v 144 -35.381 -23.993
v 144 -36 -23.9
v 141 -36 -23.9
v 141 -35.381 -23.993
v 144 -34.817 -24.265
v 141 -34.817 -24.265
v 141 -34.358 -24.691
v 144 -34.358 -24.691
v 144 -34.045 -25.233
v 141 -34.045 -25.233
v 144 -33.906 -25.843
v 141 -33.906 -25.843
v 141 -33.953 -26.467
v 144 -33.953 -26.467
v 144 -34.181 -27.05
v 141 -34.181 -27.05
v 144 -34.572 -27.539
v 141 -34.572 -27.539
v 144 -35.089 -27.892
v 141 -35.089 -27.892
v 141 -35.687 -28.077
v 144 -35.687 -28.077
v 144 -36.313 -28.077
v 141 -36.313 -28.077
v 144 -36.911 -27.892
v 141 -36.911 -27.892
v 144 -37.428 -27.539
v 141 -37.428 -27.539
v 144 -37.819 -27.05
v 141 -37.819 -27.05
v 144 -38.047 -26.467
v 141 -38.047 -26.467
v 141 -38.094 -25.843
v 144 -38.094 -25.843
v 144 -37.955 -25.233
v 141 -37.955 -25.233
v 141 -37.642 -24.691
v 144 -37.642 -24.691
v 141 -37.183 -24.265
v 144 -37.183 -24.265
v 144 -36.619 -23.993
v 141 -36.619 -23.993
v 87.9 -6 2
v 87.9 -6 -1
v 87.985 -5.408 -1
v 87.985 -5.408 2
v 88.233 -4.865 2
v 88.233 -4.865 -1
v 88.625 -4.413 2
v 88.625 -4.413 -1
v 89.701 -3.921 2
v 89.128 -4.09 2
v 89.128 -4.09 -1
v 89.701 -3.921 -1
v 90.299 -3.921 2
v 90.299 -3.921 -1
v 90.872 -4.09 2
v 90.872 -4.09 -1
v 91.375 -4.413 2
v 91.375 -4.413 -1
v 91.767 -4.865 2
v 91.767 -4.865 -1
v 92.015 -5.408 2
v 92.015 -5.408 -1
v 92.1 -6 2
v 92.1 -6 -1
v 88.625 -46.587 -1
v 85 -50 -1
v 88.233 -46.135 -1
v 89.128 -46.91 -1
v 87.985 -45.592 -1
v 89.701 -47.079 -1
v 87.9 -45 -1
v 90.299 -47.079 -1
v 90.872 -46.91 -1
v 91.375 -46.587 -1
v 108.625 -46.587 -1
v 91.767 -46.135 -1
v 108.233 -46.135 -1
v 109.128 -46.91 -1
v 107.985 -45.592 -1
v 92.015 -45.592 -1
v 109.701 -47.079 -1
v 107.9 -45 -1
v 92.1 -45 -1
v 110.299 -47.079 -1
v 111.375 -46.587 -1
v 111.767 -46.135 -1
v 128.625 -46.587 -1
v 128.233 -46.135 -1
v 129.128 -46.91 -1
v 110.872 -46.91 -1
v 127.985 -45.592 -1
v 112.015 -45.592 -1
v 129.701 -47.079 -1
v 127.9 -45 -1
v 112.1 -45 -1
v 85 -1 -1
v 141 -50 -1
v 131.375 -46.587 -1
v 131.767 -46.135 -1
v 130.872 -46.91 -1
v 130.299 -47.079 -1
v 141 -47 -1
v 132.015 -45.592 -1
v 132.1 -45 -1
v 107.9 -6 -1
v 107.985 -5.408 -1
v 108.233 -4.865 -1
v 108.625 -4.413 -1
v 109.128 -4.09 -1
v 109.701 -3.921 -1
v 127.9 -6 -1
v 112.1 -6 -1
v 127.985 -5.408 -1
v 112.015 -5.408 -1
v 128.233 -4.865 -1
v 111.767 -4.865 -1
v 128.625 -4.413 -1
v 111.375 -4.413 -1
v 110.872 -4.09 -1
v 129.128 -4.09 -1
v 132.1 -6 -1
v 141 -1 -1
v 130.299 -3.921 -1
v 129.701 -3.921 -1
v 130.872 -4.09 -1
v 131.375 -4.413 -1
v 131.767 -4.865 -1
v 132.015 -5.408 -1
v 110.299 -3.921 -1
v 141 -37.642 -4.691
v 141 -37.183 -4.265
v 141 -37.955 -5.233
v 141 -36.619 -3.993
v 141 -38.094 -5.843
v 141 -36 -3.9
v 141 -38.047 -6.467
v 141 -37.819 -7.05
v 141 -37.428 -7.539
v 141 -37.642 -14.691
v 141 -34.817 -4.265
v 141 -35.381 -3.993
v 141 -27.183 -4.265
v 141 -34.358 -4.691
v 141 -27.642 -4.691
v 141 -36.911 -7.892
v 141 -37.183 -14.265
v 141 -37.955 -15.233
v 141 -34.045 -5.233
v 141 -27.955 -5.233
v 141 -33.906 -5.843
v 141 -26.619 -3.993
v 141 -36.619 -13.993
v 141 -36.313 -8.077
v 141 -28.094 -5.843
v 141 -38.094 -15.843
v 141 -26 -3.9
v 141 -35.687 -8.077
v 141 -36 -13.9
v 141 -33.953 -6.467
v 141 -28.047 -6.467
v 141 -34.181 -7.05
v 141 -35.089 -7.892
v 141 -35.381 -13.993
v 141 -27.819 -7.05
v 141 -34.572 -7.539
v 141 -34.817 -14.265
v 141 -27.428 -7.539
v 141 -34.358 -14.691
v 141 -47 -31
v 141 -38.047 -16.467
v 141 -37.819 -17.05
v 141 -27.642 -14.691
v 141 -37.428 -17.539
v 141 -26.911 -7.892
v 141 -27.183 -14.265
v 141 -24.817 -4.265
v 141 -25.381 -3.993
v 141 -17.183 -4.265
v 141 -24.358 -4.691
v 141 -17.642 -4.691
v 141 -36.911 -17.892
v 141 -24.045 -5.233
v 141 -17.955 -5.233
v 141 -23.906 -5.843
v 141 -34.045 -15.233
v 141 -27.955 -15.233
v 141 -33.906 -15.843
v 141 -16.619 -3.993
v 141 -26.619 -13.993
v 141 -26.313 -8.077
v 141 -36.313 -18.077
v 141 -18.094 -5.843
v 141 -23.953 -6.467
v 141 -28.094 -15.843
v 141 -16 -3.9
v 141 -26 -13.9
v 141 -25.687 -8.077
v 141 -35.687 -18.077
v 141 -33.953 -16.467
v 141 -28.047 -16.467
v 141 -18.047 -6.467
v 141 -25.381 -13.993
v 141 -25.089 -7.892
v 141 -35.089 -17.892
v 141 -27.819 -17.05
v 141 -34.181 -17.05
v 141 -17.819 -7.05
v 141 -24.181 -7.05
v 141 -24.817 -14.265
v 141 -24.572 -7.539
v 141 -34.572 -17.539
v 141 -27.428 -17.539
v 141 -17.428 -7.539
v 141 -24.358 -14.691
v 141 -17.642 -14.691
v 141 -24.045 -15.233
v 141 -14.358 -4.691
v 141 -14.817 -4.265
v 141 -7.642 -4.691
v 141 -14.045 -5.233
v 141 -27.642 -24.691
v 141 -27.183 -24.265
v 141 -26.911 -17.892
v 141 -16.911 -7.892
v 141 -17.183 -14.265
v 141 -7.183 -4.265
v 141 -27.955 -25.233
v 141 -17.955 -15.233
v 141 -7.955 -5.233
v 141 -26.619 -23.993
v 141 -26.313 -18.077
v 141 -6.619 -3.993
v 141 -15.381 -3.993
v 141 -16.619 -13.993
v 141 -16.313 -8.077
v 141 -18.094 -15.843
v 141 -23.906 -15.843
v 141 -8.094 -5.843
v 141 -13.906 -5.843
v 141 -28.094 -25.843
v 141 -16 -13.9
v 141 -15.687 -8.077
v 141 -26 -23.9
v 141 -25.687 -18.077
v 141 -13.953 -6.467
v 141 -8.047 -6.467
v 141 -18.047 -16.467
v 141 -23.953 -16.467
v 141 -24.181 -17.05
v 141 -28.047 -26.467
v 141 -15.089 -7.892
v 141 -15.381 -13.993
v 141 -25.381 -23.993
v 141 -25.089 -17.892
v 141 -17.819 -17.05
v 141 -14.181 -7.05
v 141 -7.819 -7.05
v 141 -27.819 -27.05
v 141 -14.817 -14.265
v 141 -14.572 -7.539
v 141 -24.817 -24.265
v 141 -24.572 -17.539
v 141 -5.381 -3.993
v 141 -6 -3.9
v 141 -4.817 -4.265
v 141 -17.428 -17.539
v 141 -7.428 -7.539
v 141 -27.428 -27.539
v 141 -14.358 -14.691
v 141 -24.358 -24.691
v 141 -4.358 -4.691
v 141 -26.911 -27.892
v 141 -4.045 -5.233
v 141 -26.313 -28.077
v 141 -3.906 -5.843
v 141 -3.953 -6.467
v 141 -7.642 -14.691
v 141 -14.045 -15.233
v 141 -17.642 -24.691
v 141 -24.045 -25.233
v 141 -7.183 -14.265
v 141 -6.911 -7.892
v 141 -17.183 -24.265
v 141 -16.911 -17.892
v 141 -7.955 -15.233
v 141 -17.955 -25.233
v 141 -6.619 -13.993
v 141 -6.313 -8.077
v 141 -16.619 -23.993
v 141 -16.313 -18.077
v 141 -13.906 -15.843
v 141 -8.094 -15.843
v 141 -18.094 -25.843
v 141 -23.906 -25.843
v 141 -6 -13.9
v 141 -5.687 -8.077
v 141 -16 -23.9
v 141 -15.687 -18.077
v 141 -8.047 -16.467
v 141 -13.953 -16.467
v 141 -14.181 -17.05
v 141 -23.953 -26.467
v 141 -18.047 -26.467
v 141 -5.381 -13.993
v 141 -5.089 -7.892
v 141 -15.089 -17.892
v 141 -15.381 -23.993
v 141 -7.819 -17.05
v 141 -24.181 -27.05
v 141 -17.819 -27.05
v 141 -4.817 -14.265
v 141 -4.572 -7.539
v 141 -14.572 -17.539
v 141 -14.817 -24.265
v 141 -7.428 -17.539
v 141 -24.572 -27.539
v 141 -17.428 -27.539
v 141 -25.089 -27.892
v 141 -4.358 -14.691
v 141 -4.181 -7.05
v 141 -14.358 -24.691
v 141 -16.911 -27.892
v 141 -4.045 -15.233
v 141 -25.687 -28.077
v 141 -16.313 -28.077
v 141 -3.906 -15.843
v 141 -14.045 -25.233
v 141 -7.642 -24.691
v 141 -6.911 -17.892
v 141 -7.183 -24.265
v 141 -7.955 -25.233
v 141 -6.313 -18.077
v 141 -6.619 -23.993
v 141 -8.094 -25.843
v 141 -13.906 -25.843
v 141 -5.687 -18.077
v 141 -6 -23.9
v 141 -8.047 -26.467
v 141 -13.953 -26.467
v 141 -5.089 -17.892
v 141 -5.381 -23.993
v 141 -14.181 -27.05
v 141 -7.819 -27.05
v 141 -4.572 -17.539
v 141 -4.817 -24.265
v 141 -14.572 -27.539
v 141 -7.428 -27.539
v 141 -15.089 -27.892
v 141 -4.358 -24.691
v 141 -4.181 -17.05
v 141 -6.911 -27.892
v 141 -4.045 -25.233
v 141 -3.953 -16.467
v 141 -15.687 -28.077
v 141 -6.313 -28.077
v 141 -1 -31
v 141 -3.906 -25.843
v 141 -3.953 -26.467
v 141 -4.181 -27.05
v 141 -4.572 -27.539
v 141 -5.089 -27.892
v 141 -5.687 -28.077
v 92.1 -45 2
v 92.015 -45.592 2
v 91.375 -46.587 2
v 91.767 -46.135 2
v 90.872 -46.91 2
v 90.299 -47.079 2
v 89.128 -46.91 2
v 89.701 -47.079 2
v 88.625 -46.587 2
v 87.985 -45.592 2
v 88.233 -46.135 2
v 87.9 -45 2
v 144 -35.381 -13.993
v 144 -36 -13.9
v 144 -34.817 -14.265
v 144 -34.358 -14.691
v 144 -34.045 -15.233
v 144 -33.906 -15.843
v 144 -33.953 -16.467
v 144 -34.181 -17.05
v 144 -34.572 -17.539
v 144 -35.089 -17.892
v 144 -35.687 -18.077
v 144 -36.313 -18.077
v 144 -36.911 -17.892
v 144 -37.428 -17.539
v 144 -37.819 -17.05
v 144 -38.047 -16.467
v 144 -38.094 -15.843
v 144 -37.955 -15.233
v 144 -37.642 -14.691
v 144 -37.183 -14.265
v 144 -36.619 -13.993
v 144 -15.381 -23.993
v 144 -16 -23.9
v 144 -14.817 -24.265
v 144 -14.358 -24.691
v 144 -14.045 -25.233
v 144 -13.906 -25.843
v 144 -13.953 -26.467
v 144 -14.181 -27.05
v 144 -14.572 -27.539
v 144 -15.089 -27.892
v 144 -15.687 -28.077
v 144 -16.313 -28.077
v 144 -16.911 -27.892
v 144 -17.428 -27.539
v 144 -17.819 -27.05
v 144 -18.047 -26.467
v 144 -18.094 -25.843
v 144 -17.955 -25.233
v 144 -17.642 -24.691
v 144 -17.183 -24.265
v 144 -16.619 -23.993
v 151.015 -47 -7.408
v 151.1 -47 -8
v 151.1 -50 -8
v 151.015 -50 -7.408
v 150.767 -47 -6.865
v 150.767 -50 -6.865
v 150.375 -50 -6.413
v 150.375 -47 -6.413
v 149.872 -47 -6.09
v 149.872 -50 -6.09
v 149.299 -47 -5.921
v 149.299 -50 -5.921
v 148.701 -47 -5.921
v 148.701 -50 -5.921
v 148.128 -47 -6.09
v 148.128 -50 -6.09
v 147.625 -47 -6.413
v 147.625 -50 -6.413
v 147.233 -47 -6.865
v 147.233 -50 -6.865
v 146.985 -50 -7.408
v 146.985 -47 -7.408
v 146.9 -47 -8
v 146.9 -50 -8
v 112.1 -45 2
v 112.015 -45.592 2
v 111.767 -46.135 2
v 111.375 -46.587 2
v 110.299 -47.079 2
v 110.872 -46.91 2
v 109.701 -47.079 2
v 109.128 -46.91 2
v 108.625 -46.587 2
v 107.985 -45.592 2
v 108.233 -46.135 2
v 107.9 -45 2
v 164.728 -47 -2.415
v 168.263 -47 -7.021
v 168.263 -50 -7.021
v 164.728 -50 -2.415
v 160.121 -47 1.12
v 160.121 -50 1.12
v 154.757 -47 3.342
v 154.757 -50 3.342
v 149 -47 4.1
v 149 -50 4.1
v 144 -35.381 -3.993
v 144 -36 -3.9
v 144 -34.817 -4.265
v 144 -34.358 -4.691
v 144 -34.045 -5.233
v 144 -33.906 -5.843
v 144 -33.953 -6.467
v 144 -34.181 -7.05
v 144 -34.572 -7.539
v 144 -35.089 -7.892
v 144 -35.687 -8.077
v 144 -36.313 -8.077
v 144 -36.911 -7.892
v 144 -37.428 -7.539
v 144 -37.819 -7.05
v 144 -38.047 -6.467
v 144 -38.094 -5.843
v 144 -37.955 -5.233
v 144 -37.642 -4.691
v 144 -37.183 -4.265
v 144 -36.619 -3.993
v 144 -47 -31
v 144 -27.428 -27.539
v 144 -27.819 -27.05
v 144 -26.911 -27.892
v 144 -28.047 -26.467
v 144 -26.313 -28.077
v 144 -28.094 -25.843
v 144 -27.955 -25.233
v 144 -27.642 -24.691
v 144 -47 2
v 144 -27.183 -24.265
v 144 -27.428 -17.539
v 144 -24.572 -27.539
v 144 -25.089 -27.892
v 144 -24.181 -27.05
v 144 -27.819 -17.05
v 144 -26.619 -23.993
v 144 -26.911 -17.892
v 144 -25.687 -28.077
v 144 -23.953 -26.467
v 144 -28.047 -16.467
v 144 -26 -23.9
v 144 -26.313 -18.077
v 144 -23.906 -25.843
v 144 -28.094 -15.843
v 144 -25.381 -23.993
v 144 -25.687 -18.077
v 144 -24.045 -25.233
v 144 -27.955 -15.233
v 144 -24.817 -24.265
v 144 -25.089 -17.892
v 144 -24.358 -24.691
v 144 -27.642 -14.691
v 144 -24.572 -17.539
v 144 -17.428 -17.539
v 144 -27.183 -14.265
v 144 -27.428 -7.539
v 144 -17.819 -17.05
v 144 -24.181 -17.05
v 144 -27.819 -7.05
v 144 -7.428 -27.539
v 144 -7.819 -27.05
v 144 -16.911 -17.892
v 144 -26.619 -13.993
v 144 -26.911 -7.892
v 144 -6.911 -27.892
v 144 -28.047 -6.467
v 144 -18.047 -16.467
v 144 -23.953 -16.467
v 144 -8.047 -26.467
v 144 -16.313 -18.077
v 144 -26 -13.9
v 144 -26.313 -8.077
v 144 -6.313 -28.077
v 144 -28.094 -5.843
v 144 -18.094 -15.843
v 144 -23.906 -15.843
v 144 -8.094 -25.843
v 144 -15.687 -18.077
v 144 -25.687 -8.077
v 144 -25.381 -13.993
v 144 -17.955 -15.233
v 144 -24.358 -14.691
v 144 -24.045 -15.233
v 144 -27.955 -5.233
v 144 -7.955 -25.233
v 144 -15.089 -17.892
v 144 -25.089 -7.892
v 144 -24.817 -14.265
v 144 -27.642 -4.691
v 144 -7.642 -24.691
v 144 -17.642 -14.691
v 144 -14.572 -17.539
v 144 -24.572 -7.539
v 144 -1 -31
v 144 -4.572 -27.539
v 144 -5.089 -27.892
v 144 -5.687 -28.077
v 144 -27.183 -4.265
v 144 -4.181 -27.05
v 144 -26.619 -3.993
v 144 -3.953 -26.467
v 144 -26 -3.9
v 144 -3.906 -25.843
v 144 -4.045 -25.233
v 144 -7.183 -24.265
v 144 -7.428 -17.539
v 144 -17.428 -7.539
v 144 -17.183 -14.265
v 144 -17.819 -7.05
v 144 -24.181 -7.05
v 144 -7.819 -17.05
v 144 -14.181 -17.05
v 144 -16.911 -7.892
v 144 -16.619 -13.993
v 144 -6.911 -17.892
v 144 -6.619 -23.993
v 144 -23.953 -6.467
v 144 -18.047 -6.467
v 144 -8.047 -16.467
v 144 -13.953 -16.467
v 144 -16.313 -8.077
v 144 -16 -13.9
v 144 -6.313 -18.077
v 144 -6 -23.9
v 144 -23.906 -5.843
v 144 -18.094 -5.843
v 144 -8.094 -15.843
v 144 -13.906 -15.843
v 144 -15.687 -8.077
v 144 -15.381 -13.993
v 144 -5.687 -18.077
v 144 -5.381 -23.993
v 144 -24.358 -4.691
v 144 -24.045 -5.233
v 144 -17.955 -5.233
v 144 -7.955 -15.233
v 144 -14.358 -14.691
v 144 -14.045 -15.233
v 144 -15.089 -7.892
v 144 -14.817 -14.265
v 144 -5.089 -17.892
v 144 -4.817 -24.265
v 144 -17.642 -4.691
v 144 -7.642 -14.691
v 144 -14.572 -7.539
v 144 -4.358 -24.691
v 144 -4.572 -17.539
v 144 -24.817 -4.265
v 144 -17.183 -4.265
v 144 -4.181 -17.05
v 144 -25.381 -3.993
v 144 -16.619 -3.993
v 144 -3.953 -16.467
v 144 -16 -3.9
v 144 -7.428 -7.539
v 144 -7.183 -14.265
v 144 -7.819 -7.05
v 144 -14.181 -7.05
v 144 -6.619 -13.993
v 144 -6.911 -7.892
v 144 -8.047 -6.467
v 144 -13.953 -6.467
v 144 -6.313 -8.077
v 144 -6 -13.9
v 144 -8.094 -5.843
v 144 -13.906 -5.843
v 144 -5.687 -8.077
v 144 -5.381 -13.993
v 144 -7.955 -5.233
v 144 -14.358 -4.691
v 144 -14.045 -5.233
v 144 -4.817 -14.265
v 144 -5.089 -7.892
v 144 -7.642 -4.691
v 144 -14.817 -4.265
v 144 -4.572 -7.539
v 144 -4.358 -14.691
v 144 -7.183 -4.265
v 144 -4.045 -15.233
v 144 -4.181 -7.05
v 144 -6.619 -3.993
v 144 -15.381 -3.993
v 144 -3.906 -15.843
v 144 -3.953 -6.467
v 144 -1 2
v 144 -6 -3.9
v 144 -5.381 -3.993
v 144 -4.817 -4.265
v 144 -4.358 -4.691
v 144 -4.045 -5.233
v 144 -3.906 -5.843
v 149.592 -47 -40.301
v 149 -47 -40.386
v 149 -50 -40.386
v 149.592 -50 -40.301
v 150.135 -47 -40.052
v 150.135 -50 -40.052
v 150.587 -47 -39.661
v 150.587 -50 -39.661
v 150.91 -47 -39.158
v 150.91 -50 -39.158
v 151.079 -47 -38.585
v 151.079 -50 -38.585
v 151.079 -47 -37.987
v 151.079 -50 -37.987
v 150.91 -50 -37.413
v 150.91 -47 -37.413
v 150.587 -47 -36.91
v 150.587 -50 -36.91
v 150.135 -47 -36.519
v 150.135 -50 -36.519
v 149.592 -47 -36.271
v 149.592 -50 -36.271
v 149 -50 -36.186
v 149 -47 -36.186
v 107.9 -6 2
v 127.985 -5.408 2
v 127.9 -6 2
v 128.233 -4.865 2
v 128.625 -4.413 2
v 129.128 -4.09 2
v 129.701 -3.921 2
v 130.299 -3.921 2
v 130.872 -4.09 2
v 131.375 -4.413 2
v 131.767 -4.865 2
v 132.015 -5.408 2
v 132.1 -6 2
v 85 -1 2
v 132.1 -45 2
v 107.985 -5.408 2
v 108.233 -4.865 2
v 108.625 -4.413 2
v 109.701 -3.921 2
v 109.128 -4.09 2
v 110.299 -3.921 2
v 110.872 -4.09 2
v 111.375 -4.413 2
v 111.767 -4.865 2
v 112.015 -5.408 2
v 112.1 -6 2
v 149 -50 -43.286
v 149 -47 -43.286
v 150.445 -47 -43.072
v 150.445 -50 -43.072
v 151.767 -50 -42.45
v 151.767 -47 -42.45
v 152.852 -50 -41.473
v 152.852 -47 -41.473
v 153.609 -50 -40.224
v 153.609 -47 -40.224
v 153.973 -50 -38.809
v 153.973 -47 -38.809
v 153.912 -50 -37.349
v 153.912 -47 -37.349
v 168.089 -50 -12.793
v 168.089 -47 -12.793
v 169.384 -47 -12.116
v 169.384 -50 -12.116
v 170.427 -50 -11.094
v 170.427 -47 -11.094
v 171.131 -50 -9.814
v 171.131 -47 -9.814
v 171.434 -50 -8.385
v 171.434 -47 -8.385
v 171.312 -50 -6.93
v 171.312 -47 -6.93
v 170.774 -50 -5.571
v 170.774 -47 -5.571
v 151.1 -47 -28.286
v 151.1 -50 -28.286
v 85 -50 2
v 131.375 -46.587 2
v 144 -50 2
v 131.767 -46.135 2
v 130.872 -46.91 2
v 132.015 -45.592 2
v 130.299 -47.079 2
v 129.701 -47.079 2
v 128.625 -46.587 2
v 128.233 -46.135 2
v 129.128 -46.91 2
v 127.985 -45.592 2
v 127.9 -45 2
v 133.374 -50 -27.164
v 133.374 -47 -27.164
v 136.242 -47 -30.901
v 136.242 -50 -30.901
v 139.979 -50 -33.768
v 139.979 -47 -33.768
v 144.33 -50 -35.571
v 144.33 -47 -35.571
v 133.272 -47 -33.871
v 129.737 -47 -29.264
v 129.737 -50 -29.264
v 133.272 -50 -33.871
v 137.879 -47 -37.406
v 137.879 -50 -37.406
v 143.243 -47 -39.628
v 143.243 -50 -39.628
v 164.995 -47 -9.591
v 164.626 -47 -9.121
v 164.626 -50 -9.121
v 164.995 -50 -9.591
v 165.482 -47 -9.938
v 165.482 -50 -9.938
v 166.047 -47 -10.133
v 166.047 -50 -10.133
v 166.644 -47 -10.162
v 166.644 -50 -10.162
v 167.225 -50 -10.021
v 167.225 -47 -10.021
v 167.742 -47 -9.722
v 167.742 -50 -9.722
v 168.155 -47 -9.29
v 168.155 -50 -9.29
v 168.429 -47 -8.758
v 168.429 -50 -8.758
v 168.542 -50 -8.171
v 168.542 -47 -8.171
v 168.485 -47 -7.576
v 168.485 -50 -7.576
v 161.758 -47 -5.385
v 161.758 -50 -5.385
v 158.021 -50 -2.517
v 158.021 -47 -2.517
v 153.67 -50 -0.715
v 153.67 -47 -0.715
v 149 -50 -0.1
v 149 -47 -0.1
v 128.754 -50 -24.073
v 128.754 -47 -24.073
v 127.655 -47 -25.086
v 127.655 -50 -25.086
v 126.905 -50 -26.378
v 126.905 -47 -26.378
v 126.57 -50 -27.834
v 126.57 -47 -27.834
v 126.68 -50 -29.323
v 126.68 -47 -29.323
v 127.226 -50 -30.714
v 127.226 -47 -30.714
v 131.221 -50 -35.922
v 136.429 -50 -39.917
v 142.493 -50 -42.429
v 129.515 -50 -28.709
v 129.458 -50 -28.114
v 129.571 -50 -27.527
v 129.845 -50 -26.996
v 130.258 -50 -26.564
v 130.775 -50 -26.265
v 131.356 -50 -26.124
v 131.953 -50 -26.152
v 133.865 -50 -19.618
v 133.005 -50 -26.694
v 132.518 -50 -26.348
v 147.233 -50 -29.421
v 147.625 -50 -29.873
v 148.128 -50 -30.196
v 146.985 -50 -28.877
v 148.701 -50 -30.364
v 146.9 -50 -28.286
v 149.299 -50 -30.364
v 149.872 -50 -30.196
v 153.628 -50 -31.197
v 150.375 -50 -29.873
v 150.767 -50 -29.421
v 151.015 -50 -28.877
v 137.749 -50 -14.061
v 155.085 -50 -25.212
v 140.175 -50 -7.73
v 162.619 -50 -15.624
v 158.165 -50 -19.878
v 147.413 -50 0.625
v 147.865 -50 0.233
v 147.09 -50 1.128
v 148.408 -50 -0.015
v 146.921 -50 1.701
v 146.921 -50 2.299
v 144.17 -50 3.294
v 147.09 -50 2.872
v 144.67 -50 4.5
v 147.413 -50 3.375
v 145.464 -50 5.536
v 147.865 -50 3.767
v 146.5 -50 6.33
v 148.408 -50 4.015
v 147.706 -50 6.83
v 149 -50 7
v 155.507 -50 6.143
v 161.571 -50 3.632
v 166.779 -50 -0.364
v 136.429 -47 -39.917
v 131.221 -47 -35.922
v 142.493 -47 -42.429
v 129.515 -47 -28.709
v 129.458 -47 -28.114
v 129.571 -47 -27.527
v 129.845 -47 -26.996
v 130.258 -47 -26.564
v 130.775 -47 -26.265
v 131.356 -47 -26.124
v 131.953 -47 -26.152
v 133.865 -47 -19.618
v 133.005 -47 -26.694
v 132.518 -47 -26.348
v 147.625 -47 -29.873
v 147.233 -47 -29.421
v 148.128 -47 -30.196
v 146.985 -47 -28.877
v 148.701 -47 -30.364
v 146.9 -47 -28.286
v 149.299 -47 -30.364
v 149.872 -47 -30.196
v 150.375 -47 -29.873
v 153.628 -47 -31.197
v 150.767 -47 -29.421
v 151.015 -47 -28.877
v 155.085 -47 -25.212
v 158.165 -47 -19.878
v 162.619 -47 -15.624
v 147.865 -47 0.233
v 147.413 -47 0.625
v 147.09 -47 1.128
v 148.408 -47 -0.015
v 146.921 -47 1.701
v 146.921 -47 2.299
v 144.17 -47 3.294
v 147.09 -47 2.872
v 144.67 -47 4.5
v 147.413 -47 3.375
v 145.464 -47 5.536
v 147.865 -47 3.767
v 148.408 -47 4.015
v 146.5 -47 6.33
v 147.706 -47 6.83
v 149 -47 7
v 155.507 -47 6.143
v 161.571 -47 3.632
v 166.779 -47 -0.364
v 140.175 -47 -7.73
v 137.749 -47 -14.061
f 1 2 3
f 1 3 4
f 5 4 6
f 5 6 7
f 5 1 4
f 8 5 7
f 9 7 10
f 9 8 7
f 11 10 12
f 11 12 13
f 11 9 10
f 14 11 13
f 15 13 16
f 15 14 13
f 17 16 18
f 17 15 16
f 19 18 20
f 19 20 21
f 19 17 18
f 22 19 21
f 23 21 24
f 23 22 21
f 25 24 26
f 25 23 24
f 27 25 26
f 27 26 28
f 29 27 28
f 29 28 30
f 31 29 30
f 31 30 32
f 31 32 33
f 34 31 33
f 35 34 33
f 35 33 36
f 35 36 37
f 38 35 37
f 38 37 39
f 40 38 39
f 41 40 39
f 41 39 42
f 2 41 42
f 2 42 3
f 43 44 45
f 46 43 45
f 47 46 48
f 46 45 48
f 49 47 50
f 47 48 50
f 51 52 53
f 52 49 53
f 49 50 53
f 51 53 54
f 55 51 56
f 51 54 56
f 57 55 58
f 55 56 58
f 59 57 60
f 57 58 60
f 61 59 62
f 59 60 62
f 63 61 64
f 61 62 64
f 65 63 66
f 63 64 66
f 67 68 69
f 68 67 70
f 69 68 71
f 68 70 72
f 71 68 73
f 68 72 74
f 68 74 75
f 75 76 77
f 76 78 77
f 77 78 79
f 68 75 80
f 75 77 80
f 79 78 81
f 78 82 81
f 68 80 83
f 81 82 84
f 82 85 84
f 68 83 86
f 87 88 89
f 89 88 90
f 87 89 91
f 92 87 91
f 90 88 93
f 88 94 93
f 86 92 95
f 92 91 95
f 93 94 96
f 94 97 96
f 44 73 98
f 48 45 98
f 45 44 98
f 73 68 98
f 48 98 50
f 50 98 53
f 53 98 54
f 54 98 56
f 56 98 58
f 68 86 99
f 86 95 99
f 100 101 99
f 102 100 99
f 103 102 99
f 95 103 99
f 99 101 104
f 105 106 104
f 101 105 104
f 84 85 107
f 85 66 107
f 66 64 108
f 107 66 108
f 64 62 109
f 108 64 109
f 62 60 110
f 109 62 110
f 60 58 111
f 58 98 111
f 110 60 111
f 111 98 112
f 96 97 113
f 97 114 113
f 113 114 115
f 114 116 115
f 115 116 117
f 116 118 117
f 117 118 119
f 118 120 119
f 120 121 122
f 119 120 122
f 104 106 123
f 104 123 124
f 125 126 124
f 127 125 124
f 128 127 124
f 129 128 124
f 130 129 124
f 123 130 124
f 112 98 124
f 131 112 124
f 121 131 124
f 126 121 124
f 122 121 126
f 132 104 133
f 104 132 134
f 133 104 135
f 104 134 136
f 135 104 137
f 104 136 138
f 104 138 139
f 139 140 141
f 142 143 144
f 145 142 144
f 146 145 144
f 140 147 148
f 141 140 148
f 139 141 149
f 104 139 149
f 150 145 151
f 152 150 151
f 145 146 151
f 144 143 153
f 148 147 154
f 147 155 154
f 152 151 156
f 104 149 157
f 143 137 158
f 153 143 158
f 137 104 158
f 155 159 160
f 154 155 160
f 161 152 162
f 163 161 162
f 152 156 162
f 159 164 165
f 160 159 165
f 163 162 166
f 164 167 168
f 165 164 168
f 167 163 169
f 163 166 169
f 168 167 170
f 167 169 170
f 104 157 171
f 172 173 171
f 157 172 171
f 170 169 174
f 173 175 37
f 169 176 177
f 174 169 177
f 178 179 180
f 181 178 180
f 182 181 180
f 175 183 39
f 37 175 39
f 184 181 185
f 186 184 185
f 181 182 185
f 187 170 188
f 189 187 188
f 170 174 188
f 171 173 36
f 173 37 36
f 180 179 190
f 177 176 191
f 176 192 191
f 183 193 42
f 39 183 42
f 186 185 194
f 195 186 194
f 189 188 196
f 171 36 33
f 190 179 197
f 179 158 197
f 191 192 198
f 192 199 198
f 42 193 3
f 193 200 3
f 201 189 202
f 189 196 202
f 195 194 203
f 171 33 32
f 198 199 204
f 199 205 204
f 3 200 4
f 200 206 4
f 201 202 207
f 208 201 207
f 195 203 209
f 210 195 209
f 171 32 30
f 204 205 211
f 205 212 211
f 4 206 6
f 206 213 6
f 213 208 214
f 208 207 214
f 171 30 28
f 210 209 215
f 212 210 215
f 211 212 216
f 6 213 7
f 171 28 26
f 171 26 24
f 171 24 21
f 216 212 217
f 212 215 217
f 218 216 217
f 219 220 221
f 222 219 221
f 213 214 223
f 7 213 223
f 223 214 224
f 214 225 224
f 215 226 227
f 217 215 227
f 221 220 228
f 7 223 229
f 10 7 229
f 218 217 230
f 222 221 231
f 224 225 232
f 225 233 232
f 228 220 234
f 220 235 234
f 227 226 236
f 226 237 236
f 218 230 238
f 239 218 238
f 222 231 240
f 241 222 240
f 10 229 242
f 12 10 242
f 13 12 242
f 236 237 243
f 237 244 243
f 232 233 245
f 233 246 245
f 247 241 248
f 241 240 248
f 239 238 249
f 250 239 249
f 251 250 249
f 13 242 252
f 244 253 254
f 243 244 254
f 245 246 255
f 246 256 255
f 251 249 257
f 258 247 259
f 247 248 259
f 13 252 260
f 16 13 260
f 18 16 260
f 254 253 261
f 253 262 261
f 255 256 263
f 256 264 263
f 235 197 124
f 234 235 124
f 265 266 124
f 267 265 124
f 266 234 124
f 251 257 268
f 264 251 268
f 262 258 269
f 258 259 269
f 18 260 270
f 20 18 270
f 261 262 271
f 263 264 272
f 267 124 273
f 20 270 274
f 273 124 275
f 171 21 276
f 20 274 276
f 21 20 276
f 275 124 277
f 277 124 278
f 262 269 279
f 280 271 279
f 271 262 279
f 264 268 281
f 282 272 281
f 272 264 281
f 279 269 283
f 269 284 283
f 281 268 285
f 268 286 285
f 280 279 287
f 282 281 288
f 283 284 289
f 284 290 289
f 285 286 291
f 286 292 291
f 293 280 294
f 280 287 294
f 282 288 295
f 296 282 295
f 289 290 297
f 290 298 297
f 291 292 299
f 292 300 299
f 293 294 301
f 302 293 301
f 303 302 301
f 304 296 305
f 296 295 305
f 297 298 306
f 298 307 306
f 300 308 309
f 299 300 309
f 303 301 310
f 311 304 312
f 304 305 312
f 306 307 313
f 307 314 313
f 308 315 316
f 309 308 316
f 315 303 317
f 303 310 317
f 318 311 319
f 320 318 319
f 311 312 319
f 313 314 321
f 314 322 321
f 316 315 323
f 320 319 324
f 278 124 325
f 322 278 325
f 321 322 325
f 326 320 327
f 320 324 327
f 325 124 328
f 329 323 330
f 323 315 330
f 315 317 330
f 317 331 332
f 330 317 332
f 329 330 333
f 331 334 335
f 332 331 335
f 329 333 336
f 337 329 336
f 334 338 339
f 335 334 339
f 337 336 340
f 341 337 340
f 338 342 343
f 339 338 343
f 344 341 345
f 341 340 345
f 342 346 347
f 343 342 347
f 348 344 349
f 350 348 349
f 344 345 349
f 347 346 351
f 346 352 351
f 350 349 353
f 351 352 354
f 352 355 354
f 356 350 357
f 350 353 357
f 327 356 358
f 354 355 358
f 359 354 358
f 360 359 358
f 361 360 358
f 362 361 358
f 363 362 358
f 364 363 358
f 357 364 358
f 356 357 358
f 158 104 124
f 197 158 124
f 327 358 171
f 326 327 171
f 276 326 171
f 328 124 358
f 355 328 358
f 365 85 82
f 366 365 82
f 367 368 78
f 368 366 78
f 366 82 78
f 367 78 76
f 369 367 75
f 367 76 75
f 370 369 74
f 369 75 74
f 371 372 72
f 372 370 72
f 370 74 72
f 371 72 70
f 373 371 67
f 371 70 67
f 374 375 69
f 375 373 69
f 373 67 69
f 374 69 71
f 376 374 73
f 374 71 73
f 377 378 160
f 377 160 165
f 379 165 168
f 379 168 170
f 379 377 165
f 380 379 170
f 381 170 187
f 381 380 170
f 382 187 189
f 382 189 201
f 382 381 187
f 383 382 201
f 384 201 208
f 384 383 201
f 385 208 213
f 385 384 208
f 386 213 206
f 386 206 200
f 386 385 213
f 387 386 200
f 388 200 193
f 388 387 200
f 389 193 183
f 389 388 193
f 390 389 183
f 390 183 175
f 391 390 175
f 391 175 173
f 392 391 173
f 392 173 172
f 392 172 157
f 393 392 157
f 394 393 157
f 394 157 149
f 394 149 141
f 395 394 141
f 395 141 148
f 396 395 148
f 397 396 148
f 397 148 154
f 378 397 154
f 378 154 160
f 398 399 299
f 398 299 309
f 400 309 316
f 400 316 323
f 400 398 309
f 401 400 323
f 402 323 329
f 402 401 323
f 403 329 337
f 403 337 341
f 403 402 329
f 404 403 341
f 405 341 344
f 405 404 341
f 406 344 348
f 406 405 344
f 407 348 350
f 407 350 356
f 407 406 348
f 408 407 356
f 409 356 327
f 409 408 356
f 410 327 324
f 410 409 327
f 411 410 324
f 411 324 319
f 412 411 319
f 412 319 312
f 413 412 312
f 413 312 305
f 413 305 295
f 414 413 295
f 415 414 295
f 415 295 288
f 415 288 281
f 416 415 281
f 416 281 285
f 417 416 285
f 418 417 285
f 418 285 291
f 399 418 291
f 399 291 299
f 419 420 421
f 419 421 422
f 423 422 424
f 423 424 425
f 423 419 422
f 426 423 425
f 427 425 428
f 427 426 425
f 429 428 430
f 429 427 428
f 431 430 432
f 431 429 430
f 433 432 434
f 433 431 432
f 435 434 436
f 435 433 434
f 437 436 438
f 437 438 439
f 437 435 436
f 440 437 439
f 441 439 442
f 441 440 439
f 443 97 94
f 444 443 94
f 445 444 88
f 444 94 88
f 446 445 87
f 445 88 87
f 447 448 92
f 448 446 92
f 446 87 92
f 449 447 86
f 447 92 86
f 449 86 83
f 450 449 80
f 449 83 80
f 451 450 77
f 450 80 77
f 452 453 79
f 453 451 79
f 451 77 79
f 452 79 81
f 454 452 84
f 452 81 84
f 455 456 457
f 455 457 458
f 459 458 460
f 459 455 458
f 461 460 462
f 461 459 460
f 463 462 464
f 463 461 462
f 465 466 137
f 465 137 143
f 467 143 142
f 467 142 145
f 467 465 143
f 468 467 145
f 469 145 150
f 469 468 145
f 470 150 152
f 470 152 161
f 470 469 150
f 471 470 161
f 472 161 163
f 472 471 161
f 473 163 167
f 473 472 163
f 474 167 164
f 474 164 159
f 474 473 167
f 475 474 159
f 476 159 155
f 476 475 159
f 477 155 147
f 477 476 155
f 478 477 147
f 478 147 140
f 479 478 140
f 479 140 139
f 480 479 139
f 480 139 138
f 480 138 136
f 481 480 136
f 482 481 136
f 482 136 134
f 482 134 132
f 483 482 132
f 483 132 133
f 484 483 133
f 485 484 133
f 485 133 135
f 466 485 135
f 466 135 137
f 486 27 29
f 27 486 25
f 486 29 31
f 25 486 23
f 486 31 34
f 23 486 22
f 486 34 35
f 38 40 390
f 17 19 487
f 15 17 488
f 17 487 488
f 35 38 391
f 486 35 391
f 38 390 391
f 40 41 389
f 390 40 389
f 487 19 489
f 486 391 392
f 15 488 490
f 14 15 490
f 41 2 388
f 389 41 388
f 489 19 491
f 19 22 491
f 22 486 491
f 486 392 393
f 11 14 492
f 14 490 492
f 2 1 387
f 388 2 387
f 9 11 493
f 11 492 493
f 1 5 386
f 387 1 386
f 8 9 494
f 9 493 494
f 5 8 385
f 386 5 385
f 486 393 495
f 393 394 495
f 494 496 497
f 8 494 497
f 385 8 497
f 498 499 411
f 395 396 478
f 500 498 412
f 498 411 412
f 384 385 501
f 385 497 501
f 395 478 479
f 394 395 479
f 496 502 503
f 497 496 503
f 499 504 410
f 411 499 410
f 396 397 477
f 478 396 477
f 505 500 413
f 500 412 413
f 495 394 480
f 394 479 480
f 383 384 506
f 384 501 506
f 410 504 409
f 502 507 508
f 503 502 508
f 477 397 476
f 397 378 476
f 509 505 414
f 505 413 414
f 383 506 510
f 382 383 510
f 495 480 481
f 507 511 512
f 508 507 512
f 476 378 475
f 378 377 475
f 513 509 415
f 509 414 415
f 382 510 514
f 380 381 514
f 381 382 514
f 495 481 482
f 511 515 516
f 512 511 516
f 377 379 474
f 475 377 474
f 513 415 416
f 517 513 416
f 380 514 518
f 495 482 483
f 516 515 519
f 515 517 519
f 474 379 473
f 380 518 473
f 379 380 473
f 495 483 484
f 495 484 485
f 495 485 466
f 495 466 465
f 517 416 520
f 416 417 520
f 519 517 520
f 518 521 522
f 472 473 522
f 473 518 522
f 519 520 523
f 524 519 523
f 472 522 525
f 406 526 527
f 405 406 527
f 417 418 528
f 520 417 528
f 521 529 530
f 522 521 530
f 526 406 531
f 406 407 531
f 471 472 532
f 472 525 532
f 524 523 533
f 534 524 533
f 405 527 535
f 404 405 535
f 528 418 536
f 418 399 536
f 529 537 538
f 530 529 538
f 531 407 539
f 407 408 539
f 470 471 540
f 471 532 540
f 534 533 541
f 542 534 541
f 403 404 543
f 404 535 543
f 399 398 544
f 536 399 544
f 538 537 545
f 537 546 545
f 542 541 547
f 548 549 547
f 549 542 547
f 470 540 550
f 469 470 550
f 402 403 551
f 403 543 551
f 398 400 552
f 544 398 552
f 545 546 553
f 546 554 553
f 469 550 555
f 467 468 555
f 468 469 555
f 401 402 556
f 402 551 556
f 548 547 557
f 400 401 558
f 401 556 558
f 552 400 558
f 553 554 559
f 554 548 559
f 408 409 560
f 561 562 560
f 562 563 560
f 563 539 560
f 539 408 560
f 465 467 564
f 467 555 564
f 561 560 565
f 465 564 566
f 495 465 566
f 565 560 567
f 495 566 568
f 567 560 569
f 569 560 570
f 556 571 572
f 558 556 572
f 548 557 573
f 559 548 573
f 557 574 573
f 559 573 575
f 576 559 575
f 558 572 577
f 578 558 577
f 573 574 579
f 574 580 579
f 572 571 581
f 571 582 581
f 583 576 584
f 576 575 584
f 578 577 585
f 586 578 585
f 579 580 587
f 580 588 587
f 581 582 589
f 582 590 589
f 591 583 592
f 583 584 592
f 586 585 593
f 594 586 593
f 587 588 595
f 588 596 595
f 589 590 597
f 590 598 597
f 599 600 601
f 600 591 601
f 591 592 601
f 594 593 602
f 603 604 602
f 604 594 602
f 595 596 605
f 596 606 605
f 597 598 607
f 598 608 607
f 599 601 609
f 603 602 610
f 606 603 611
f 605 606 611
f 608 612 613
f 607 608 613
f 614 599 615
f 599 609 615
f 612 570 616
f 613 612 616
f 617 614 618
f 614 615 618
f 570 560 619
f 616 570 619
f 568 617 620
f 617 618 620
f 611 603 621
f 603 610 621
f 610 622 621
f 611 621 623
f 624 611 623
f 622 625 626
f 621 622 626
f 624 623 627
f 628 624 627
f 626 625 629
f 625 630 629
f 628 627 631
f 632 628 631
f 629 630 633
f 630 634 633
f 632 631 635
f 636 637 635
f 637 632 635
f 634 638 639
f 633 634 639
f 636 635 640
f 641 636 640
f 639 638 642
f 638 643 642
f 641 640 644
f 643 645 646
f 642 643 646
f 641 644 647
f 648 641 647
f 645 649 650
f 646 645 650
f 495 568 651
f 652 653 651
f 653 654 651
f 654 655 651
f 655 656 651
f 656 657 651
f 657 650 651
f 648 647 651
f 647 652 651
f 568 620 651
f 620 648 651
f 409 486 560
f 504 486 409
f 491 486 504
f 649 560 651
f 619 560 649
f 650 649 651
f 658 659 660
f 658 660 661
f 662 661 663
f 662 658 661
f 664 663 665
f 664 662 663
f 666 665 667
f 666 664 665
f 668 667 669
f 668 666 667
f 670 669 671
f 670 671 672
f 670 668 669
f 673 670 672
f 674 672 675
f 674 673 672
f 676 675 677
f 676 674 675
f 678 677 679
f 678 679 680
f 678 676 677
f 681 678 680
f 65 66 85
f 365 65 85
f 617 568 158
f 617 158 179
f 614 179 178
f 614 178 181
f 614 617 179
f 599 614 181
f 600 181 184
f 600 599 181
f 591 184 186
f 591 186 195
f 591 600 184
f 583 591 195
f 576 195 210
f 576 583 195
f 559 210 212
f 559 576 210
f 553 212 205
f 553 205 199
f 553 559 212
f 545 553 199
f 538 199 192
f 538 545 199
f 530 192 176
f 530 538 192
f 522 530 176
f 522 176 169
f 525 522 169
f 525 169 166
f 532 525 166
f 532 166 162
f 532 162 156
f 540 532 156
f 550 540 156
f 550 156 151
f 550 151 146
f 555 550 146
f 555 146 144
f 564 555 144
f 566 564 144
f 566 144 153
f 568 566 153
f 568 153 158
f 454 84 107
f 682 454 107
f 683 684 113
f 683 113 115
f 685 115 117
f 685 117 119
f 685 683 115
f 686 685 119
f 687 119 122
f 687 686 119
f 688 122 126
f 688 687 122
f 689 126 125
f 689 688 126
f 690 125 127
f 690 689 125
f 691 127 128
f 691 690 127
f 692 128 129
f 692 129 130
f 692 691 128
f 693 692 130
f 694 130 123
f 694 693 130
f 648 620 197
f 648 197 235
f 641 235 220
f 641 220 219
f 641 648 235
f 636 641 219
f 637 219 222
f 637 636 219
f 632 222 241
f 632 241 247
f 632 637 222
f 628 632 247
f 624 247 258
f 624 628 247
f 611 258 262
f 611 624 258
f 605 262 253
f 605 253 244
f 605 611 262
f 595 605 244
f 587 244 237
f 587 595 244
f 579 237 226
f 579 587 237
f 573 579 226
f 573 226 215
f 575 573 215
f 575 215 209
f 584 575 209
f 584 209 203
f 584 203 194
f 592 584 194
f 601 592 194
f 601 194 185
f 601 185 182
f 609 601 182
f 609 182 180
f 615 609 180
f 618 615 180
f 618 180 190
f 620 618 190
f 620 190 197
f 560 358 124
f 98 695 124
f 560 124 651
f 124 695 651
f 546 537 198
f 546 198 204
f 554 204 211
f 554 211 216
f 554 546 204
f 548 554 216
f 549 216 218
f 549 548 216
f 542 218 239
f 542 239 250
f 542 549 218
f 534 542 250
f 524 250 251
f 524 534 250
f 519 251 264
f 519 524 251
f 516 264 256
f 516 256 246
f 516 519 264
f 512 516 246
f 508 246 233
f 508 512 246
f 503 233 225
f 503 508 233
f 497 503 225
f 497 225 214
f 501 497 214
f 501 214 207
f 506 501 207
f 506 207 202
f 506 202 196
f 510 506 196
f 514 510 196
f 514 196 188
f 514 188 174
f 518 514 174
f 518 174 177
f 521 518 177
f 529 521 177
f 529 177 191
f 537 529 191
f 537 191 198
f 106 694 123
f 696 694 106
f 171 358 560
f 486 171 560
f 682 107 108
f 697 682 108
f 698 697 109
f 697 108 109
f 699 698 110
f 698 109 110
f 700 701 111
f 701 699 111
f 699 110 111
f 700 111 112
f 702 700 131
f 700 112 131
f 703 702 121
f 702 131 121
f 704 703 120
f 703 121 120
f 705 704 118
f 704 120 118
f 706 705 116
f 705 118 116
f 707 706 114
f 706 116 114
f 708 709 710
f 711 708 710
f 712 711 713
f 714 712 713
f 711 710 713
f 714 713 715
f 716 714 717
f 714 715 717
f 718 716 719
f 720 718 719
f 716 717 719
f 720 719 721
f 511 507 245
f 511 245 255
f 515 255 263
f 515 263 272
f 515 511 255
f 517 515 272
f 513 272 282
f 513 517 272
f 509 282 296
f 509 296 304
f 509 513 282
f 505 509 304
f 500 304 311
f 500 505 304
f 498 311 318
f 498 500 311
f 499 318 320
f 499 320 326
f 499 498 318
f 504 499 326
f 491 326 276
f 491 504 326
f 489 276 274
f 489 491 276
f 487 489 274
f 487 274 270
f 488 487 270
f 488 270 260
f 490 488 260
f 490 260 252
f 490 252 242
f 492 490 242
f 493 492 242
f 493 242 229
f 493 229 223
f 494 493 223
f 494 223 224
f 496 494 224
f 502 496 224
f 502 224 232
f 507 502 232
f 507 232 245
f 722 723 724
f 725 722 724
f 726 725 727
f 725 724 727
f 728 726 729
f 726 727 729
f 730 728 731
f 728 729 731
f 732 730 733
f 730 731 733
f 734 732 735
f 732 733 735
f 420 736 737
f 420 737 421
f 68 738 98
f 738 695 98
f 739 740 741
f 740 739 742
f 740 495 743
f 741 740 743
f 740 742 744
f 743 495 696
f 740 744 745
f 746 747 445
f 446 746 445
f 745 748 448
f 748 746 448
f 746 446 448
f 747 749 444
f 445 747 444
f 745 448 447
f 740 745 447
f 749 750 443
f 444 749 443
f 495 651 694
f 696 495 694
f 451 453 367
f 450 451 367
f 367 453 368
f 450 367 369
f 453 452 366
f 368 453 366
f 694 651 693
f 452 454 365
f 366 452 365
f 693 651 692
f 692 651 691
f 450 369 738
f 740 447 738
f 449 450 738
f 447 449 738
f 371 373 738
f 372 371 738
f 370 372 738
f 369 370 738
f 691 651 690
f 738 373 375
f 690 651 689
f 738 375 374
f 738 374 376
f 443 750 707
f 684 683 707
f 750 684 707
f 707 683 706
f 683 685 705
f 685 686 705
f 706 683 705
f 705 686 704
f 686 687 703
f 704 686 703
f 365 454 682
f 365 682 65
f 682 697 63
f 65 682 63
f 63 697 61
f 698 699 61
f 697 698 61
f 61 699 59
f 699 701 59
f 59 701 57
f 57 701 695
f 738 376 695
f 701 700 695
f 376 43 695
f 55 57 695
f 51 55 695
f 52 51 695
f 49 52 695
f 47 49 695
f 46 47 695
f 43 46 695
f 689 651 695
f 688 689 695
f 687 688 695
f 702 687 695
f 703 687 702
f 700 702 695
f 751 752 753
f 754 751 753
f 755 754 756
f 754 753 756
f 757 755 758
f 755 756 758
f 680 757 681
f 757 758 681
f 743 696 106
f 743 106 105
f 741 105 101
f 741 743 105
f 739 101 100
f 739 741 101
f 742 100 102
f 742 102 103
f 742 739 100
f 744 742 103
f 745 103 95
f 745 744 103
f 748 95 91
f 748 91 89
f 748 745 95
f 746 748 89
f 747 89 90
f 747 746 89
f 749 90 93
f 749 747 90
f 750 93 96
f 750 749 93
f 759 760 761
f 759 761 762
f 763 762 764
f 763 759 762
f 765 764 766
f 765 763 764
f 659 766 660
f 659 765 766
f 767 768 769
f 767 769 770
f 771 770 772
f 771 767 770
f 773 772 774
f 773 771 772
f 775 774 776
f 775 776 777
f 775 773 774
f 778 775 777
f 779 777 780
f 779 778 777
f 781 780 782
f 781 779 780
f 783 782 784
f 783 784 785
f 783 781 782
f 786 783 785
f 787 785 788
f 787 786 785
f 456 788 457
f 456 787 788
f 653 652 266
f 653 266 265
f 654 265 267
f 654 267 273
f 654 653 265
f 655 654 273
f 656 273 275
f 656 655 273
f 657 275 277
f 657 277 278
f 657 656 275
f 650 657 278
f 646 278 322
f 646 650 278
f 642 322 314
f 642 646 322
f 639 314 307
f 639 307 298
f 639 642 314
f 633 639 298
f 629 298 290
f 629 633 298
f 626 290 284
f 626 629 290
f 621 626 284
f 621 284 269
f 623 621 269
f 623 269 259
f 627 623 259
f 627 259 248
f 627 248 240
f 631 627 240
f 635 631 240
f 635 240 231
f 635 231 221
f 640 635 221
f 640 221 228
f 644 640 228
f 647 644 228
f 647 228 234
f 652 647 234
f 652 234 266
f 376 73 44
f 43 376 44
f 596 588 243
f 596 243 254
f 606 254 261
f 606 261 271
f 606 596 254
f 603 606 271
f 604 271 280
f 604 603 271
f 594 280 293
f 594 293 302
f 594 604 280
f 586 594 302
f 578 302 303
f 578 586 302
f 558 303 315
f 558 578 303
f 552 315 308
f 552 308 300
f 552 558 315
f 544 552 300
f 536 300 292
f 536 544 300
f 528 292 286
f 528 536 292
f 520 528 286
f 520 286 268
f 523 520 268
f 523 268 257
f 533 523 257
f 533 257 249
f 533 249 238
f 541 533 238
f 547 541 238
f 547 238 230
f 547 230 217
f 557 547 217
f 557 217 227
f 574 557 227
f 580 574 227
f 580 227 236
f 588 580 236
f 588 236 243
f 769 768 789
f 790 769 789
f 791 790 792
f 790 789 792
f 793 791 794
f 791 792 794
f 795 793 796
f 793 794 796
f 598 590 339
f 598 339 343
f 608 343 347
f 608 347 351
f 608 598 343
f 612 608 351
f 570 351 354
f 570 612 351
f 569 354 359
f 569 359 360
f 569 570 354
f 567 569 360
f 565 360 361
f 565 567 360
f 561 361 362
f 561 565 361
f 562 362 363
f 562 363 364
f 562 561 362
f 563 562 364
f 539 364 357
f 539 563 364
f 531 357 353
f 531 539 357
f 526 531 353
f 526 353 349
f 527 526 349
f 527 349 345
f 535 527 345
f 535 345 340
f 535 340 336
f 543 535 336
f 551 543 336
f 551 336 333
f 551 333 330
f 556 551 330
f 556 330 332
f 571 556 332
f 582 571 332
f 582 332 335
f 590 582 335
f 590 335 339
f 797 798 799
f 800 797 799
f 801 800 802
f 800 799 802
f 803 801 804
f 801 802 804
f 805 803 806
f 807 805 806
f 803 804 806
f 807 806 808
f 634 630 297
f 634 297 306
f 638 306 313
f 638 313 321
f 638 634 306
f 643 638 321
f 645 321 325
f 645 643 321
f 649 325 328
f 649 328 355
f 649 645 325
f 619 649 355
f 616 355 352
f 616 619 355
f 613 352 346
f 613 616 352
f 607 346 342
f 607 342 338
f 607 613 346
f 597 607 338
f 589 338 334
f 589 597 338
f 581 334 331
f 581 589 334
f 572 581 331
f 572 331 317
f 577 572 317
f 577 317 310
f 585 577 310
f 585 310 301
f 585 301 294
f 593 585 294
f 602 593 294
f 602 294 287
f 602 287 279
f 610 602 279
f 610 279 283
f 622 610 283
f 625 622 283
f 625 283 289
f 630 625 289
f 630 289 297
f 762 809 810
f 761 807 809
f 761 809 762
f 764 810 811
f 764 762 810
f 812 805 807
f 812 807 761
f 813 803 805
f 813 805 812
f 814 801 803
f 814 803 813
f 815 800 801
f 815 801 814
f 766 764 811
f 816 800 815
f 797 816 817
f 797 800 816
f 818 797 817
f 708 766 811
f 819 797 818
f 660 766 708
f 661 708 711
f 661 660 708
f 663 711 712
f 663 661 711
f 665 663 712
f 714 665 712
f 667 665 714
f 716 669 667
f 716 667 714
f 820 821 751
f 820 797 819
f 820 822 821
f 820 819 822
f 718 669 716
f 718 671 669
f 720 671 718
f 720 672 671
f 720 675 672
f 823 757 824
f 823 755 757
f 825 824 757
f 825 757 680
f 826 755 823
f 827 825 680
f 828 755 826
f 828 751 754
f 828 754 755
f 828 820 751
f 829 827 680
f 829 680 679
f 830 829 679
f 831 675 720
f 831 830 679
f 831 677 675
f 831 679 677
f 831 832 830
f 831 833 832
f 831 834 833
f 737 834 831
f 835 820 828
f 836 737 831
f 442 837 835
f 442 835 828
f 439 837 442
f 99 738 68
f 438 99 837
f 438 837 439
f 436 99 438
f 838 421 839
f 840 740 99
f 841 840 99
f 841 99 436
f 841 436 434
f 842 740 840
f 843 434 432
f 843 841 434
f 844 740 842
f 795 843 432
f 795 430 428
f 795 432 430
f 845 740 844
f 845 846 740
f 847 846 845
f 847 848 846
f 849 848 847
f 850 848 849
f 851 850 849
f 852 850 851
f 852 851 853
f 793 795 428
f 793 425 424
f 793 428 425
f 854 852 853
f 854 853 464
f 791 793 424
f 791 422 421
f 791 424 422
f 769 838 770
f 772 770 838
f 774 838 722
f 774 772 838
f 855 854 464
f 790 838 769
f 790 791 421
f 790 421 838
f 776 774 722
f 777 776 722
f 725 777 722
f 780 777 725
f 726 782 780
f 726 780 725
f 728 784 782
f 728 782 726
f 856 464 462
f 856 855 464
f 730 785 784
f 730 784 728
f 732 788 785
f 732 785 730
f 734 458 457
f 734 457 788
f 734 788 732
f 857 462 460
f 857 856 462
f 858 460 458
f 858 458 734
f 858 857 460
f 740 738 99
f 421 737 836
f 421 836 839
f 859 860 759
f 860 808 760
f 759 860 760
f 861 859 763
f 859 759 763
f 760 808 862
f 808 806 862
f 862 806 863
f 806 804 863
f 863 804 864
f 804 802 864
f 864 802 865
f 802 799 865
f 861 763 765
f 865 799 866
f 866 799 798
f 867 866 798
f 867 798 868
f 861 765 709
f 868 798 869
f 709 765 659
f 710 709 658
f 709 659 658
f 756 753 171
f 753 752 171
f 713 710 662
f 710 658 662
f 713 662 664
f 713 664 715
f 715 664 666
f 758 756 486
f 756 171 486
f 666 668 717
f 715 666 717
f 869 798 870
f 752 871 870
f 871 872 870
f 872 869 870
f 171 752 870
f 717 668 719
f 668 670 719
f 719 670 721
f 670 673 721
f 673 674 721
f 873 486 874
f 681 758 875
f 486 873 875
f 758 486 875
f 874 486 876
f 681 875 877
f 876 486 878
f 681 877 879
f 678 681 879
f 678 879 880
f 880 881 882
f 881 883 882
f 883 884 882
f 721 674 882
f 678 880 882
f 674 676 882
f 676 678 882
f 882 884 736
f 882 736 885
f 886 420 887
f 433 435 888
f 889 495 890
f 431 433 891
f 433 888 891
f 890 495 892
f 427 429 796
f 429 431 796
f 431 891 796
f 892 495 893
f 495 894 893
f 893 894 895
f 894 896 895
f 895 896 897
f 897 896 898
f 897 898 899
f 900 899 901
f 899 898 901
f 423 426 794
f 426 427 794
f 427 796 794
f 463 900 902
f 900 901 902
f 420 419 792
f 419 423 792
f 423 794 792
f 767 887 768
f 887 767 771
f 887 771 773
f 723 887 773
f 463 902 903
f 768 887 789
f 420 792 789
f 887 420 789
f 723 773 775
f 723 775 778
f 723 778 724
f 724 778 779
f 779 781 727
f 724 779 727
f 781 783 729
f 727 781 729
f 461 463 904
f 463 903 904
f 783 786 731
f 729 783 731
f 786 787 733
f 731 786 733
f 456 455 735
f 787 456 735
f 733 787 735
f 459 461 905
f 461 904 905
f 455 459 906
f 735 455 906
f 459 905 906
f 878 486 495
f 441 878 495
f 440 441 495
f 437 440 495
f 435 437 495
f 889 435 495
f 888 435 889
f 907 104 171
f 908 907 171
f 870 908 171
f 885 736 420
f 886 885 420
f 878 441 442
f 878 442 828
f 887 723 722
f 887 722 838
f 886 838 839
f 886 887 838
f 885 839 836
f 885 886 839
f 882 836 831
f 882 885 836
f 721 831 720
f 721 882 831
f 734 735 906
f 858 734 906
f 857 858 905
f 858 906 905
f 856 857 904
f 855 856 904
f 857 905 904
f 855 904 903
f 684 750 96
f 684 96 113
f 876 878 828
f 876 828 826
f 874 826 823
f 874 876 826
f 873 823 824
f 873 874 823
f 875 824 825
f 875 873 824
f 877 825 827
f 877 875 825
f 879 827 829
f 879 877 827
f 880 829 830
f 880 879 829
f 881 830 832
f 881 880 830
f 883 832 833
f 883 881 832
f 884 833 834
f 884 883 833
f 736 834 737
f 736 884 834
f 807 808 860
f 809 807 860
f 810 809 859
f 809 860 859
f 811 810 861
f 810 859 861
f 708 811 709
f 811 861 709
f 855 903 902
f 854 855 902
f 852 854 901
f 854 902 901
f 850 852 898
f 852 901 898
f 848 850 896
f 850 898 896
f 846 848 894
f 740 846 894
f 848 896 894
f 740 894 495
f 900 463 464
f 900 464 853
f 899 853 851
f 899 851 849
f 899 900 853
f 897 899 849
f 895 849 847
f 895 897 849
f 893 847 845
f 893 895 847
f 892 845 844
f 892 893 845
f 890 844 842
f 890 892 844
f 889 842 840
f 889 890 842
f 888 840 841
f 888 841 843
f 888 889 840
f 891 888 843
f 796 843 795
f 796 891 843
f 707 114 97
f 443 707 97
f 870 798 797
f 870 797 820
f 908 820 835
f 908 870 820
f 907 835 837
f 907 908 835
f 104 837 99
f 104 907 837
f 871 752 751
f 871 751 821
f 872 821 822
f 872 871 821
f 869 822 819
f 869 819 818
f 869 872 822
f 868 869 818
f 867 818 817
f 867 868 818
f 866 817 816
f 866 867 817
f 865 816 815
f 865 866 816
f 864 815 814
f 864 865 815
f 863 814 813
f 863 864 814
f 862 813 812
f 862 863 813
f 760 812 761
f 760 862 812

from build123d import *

# Parameters (mm, degrees)
PAD037_DEPTH      = 46
PAD037_DEPTH_BACK = 3
PAD038_DEPTH      = 3
POCKET016_DEPTH   = 10
SKETCH066_R       = 2.1
POCKET023_DEPTH   = 5


with BuildPart() as tentingleg:
    # Sketch054 → Pad037 (new body, two sides)
    with BuildSketch(Plane.XZ) as pad037_sk:
        Polygon((-55, -1), (-5, -1), (1, -1), (1, -31), (3.9999999999, -31), (3.9999999999, -1), (3.9999999999, 2), (-5, 2), (-55, 2), align=None)
    extrude(amount=PAD037_DEPTH)
    extrude(pad037_sk.sketch, amount=-PAD037_DEPTH_BACK)

    # Sketch055 → Pad038 (join)
    with BuildSketch(Plane.XZ):
        with BuildLine():
            ThreePointArc((8.9999999999, -43.2857142857), (12.8523729567, -41.4730678277), (13.9115498355, -37.3494033264))
            ThreePointArc((28.0891318316, -12.7931109807), (16.4349866323, -22.4354486765), (13.9115498355, -37.3494033264))
            ThreePointArc((28.0891318316, -12.7931109807), (31.130741607, -9.8140046459), (30.7743530093, -5.5714285714))
            ThreePointArc((30.7743530093, -5.5714285714), (21.5714285713, 3.6314958666), (8.9999999999, 7))
            ThreePointArc((8.9999999999, 7), (5.464466094, 5.5355339059), (3.9999999999, 2))
            Line((3.9999999999, 2), (1, -1))
            ThreePointArc((-11.2463328898, -24.0732475684), (-2.2513043788, -14.0608903085), (1, -1))
            ThreePointArc((-11.2463328898, -24.0732475684), (-13.3169087301, -27.0931421371), (-12.7743530095, -30.7142857143))
            ThreePointArc((-12.7743530095, -30.7142857143), (-3.5714285715, -39.9172101523), (8.9999999999, -43.2857142857))
        make_face()
        with BuildLine():
            ThreePointArc((6.8999999999, -28.2857142857), (8.9999999999, -30.3857142857), (11.0999999999, -28.2857142857))
            Line((11.0999999999, -28.2857142857), (11.0999999999, -8))
            ThreePointArc((11.0999999999, -8), (8.9999999999, -5.9), (6.8999999999, -8))
            Line((6.8999999999, -8), (6.8999999999, -28.2857142857))
        make_face(mode=Mode.SUBTRACT)
        with BuildLine():
            ThreePointArc((8.9999999999, -40.3857142857), (11.0999999999, -38.2857142857), (8.9999999999, -36.1857142857))
            ThreePointArc((-6.6255726426, -27.1642857143), (-0.0214285715, -33.7684297854), (8.9999999999, -36.1857142857))
            ThreePointArc((-6.6255726426, -27.1642857143), (-9.4942259906, -26.3956323663), (-10.2628793385, -29.2642857143))
            ThreePointArc((-10.2628793385, -29.2642857143), (-2.1214285715, -37.4057364813), (8.9999999999, -40.3857142857))
        make_face(mode=Mode.SUBTRACT)
        with BuildLine():
            ThreePointArc((8.9999999999, 4.1), (6.8999999999, 2), (8.9999999999, -0.1))
            ThreePointArc((24.6255726425, -9.1214285714), (18.0214285713, -2.5172845003), (8.9999999999, -0.1))
            ThreePointArc((24.6255726425, -9.1214285714), (27.4942259904, -9.8900819194), (28.2628793384, -7.0214285714))
            ThreePointArc((28.2628793384, -7.0214285714), (20.1214285713, 1.1200221956), (8.9999999999, 4.1))
        make_face(mode=Mode.SUBTRACT)
    extrude(amount=-PAD038_DEPTH)

    # Sketch056 → Pocket016 (cut, symmetric)
    with BuildSketch(Plane.XY):
        with BuildLine():
            ThreePointArc((-47.9, -2), (-50, 0.1), (-52.1, -2))
            Line((-52.1, -2), (-52.1, -41))
            ThreePointArc((-52.1, -41), (-50, -43.1), (-47.9, -41))
            Line((-47.9, -41), (-47.9, -2))
        make_face()
        with BuildLine():
            ThreePointArc((-27.9, -2), (-30, 0.1), (-32.1, -2))
            Line((-32.1, -2), (-32.1, -41))
            ThreePointArc((-32.1, -41), (-30, -43.1), (-27.9, -41))
            Line((-27.9, -41), (-27.9, -2))
        make_face()
        with BuildLine():
            ThreePointArc((-7.9, -2), (-10, 0.1), (-12.1, -2))
            Line((-12.1, -2), (-12.1, -41))
            ThreePointArc((-12.1, -41), (-10, -43.1), (-7.9, -41))
            Line((-7.9, -41), (-7.9, -2))
        make_face()
    extrude(amount=POCKET016_DEPTH, both=True, mode=Mode.SUBTRACT)

    # Sketch066 (on Face45 of Pocket016) → Pocket023 (cut)
    with BuildSketch(Plane(origin=(3.9999999999, 0, 0), x_dir=(0, 0, 1), z_dir=(1, 0, 0))):
        with Locations((-26, 41)):
            Circle(SKETCH066_R)
        with Locations((-16, 31)):
            Circle(SKETCH066_R)
        with Locations((-16, 21)):
            Circle(SKETCH066_R)
        with Locations((-16, 41)):
            Circle(SKETCH066_R)
        with Locations((-6, 31)):
            Circle(SKETCH066_R)
        with Locations((-6, 41)):
            Circle(SKETCH066_R)
        with Locations((-26, 31)):
            Circle(SKETCH066_R)
        with Locations((-26, 21)):
            Circle(SKETCH066_R)
        with Locations((-26, 11)):
            Circle(SKETCH066_R)
        with Locations((-16, 11)):
            Circle(SKETCH066_R)
        with Locations((-6, 11)):
            Circle(SKETCH066_R)
        with Locations((-6, 21)):
            Circle(SKETCH066_R)
    extrude(amount=-POCKET023_DEPTH, mode=Mode.SUBTRACT)


with BuildPart() as tentingleg_1:
    # Body012 placement: moved
    add(tentingleg.part.moved(Location((140, 47, 0))))


with BuildPart() as part_mirroring:
    # Part__Mirroring: instance of TentingLeg
    add(tentingleg_1.part.mirror(Plane(origin=(119.6685180664, 0, -14.4371900558), x_dir=(1, 0, 0), z_dir=(0, 1, -1.192e-07))))


solid = part_mirroring.part
